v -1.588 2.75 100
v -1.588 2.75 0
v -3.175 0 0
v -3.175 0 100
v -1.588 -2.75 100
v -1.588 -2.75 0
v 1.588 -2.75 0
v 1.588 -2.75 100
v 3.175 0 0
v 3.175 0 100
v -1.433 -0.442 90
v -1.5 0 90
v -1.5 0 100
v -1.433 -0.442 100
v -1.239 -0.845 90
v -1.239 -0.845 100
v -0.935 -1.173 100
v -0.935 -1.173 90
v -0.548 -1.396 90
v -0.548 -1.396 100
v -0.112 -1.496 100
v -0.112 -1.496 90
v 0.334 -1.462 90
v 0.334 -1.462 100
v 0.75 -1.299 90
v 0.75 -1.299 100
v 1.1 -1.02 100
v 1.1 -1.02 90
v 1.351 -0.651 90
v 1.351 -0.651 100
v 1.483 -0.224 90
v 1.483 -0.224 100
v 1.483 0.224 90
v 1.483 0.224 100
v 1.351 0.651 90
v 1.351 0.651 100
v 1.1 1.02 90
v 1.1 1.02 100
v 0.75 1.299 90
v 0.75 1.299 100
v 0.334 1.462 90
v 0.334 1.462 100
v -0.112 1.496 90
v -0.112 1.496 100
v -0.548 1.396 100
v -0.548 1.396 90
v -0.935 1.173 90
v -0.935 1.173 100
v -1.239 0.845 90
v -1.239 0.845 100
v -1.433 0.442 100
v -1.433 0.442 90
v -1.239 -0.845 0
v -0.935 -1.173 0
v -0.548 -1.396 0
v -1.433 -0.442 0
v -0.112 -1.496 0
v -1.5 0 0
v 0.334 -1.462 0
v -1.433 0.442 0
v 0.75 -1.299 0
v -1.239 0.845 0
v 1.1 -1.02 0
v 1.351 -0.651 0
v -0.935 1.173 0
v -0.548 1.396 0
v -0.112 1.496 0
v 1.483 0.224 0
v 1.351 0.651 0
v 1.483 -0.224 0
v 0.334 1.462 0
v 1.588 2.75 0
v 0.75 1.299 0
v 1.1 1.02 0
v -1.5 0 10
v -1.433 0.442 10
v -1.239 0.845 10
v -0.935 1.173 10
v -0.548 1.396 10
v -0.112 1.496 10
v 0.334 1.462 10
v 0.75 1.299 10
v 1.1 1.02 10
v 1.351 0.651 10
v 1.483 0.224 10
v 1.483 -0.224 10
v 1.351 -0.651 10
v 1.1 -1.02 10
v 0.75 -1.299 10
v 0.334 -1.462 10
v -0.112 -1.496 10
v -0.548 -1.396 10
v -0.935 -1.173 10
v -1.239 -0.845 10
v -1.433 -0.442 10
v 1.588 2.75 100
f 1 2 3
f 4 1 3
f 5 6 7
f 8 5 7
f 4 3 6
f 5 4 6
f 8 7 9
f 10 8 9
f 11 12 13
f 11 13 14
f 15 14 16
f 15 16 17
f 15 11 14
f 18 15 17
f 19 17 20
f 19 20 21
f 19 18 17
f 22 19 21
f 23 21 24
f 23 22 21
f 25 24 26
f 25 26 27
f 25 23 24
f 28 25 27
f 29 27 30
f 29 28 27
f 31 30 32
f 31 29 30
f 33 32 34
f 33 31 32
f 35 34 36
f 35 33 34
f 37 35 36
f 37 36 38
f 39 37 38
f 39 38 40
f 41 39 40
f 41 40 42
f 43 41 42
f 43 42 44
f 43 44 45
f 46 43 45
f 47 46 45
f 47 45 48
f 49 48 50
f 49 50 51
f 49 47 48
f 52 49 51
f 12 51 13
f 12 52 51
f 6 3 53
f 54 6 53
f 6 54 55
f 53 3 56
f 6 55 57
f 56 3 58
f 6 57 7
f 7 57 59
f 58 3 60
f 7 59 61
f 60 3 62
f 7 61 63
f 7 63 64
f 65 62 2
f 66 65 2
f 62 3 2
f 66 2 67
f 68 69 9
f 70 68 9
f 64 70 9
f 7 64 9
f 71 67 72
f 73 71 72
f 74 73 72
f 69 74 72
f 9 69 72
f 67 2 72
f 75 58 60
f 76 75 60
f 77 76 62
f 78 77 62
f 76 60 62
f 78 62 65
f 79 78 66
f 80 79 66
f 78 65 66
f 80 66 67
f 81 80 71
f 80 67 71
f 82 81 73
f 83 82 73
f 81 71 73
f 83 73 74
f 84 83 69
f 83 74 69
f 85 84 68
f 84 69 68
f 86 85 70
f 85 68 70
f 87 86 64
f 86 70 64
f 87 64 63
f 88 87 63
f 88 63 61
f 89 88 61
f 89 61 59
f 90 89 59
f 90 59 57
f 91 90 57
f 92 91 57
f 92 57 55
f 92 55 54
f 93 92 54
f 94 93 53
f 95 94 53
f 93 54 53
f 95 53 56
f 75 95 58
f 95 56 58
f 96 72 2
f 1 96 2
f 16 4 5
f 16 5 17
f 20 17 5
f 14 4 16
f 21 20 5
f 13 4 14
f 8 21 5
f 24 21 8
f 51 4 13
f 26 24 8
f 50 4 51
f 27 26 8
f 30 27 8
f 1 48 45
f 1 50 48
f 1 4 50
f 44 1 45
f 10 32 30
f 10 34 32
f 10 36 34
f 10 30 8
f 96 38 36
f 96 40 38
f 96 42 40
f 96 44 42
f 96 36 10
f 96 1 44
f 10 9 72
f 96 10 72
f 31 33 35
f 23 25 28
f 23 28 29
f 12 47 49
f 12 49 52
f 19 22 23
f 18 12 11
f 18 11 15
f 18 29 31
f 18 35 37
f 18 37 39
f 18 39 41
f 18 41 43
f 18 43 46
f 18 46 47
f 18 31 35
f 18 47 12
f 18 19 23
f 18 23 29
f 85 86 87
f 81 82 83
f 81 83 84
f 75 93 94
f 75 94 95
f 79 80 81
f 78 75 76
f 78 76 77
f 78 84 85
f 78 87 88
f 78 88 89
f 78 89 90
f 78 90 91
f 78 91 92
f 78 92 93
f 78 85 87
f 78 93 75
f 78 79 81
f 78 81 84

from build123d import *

# Parameters (mm, degrees)
EXTRUDE_1_DEPTH     = 100
SKETCH_2_R          = 1.5
CUT_EXTRUDE_1_DEPTH = 10
CUT_EXTRUDE_START   = -10
SKETCH_3_R          = 1.5
CUT_EXTRUDE_2_DEPTH = 10


with BuildPart() as part:
    # Эскиз1 → Бобышка-Вытянуть1 (new body)
    with BuildSketch(Plane.XY):
        Polygon((1.58771324, -2.75), (3.175426481, 0), (1.58771324, 2.75), (-1.58771324, 2.75), (-3.175426481, 0), (-1.58771324, -2.75), align=None)
    extrude(amount=EXTRUDE_1_DEPTH)

    # Эскиз2 → Вырез-Вытянуть1 (cut)
    with BuildSketch(Plane(origin=(0, 0, 0), x_dir=(-1, 0, 0), z_dir=(0, 0, -1))):
        Circle(SKETCH_2_R)
    extrude(amount=-CUT_EXTRUDE_1_DEPTH, mode=Mode.SUBTRACT)

    # Эскиз3 → Вырез-Вытянуть2 (cut)
    with BuildSketch(Plane.XY.offset(100).offset(CUT_EXTRUDE_START)):
        with Locations(Location((0, 0, 0), (0, 0, 180))):
            Circle(SKETCH_3_R)
    extrude(amount=CUT_EXTRUDE_2_DEPTH, mode=Mode.SUBTRACT)


solid = part.part
